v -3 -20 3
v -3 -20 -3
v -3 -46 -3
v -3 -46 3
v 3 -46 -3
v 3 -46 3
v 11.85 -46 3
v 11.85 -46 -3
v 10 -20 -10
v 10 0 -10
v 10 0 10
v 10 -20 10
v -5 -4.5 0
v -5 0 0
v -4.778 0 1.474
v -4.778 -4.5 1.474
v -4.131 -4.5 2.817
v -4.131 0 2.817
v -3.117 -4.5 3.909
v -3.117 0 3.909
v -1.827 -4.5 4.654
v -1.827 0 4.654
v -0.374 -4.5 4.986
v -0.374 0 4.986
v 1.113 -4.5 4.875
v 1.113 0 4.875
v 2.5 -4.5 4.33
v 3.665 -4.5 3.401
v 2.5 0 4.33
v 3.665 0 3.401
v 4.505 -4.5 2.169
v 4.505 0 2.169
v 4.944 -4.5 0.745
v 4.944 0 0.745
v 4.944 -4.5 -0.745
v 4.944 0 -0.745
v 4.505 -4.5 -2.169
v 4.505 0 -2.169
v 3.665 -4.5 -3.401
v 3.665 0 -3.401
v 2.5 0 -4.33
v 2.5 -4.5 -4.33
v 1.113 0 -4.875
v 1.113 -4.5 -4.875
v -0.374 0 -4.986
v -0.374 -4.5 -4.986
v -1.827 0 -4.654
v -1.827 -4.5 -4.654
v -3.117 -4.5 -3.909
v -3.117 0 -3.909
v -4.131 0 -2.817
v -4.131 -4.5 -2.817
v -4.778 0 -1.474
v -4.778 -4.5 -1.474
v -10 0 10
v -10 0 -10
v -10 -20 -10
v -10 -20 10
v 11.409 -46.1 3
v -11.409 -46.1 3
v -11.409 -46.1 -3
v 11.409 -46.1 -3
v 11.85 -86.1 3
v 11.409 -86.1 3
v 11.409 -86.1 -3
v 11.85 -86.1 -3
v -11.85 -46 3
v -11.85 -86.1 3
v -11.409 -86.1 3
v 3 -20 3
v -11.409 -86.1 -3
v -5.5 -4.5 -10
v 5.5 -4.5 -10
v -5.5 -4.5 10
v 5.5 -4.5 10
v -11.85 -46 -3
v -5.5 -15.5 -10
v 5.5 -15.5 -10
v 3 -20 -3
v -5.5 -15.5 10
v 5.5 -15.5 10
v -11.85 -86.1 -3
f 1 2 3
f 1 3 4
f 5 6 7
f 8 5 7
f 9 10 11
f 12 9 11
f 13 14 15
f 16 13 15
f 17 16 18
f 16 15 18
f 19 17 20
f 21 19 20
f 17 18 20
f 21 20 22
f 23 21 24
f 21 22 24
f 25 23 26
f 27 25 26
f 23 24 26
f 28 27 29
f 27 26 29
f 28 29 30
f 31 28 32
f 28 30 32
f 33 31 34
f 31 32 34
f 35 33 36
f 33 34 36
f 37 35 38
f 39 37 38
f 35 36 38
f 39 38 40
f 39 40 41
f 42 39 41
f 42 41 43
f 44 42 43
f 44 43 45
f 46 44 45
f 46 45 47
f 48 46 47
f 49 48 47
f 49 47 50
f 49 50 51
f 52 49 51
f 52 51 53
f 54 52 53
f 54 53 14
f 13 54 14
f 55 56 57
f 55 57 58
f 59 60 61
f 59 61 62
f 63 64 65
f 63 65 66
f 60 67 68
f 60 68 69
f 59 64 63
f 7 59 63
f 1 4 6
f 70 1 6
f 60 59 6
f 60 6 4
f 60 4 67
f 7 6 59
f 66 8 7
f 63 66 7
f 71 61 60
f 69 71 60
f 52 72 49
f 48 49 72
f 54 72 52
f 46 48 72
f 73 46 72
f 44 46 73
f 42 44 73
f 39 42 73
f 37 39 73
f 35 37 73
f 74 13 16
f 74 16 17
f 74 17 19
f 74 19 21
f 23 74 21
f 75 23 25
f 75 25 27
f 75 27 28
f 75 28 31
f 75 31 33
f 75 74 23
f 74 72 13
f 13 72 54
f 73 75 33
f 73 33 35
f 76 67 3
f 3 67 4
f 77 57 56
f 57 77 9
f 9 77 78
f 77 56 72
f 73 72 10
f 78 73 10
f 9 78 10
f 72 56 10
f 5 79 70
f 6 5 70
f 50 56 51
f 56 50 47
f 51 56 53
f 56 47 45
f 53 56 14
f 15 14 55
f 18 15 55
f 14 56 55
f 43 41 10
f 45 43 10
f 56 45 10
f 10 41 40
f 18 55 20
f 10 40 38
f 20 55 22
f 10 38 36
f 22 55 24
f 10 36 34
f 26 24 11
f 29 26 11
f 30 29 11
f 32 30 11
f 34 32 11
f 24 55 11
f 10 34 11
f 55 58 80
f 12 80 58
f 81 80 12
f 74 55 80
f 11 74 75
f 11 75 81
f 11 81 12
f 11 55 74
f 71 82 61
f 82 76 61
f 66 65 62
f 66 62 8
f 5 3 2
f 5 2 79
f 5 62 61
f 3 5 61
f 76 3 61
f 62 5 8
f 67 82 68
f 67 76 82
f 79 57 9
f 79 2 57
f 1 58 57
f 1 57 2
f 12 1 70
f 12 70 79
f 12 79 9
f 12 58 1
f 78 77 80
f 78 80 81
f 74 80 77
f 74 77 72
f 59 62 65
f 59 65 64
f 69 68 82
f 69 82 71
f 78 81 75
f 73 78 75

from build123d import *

# Parameters (mm, degrees)
F0_W      = 20
F0_H      = 20
F1_DEPTH  = 20
F2_W      = 11
F2_H      = 11
F3_DEPTH  = 25
F4_W      = 6
F4_H      = 6
F5_DEPTH  = 26
F6_W      = 23.7
F6_H      = 6
F7_DEPTH  = 0.1
F8_W      = 0.44082
F8_H      = 6
F9_DEPTH  = 40
F10_R     = 5
F11_DEPTH = 10


with BuildPart() as f1:
    # F0 (on Front) → F1 (new body)
    with BuildSketch(Plane.XZ):
        Rectangle(F0_W, F0_H)
    extrude(amount=F1_DEPTH)

    # F2 (on face) → F3 (cut)
    with BuildSketch(Plane.XY.offset(10)):
        with Locations((0, -10)):
            Rectangle(F2_W, F2_H)
    extrude(amount=-F3_DEPTH, mode=Mode.SUBTRACT)

    # F4 (on face) → F5 (join)
    with BuildSketch(Plane.XZ.offset(20)):
        Rectangle(F4_W, F4_H)
    extrude(amount=F5_DEPTH)

    # F6 (on face) → F7 (join)
    with BuildSketch(Plane.XZ.offset(46)):
        Rectangle(F6_W, F6_H)
    extrude(amount=F7_DEPTH)

    # F8 (on face) → F9 (join)
    with BuildSketch(Plane.XZ.offset(46.1)):
        with Locations((-11.62959, 0)):
            Rectangle(F8_W, F8_H)
        with Locations((11.62959, 0)):
            Rectangle(F8_W, F8_H)
    extrude(amount=F9_DEPTH)

    # F10 (on face) → F11 (cut)
    with BuildSketch(Plane(origin=(0, 0, 0), x_dir=(-1, 0, 0), z_dir=(0, 1, 0))):
        Circle(F10_R)
    extrude(amount=-F11_DEPTH, mode=Mode.SUBTRACT)


solid = f1.part
